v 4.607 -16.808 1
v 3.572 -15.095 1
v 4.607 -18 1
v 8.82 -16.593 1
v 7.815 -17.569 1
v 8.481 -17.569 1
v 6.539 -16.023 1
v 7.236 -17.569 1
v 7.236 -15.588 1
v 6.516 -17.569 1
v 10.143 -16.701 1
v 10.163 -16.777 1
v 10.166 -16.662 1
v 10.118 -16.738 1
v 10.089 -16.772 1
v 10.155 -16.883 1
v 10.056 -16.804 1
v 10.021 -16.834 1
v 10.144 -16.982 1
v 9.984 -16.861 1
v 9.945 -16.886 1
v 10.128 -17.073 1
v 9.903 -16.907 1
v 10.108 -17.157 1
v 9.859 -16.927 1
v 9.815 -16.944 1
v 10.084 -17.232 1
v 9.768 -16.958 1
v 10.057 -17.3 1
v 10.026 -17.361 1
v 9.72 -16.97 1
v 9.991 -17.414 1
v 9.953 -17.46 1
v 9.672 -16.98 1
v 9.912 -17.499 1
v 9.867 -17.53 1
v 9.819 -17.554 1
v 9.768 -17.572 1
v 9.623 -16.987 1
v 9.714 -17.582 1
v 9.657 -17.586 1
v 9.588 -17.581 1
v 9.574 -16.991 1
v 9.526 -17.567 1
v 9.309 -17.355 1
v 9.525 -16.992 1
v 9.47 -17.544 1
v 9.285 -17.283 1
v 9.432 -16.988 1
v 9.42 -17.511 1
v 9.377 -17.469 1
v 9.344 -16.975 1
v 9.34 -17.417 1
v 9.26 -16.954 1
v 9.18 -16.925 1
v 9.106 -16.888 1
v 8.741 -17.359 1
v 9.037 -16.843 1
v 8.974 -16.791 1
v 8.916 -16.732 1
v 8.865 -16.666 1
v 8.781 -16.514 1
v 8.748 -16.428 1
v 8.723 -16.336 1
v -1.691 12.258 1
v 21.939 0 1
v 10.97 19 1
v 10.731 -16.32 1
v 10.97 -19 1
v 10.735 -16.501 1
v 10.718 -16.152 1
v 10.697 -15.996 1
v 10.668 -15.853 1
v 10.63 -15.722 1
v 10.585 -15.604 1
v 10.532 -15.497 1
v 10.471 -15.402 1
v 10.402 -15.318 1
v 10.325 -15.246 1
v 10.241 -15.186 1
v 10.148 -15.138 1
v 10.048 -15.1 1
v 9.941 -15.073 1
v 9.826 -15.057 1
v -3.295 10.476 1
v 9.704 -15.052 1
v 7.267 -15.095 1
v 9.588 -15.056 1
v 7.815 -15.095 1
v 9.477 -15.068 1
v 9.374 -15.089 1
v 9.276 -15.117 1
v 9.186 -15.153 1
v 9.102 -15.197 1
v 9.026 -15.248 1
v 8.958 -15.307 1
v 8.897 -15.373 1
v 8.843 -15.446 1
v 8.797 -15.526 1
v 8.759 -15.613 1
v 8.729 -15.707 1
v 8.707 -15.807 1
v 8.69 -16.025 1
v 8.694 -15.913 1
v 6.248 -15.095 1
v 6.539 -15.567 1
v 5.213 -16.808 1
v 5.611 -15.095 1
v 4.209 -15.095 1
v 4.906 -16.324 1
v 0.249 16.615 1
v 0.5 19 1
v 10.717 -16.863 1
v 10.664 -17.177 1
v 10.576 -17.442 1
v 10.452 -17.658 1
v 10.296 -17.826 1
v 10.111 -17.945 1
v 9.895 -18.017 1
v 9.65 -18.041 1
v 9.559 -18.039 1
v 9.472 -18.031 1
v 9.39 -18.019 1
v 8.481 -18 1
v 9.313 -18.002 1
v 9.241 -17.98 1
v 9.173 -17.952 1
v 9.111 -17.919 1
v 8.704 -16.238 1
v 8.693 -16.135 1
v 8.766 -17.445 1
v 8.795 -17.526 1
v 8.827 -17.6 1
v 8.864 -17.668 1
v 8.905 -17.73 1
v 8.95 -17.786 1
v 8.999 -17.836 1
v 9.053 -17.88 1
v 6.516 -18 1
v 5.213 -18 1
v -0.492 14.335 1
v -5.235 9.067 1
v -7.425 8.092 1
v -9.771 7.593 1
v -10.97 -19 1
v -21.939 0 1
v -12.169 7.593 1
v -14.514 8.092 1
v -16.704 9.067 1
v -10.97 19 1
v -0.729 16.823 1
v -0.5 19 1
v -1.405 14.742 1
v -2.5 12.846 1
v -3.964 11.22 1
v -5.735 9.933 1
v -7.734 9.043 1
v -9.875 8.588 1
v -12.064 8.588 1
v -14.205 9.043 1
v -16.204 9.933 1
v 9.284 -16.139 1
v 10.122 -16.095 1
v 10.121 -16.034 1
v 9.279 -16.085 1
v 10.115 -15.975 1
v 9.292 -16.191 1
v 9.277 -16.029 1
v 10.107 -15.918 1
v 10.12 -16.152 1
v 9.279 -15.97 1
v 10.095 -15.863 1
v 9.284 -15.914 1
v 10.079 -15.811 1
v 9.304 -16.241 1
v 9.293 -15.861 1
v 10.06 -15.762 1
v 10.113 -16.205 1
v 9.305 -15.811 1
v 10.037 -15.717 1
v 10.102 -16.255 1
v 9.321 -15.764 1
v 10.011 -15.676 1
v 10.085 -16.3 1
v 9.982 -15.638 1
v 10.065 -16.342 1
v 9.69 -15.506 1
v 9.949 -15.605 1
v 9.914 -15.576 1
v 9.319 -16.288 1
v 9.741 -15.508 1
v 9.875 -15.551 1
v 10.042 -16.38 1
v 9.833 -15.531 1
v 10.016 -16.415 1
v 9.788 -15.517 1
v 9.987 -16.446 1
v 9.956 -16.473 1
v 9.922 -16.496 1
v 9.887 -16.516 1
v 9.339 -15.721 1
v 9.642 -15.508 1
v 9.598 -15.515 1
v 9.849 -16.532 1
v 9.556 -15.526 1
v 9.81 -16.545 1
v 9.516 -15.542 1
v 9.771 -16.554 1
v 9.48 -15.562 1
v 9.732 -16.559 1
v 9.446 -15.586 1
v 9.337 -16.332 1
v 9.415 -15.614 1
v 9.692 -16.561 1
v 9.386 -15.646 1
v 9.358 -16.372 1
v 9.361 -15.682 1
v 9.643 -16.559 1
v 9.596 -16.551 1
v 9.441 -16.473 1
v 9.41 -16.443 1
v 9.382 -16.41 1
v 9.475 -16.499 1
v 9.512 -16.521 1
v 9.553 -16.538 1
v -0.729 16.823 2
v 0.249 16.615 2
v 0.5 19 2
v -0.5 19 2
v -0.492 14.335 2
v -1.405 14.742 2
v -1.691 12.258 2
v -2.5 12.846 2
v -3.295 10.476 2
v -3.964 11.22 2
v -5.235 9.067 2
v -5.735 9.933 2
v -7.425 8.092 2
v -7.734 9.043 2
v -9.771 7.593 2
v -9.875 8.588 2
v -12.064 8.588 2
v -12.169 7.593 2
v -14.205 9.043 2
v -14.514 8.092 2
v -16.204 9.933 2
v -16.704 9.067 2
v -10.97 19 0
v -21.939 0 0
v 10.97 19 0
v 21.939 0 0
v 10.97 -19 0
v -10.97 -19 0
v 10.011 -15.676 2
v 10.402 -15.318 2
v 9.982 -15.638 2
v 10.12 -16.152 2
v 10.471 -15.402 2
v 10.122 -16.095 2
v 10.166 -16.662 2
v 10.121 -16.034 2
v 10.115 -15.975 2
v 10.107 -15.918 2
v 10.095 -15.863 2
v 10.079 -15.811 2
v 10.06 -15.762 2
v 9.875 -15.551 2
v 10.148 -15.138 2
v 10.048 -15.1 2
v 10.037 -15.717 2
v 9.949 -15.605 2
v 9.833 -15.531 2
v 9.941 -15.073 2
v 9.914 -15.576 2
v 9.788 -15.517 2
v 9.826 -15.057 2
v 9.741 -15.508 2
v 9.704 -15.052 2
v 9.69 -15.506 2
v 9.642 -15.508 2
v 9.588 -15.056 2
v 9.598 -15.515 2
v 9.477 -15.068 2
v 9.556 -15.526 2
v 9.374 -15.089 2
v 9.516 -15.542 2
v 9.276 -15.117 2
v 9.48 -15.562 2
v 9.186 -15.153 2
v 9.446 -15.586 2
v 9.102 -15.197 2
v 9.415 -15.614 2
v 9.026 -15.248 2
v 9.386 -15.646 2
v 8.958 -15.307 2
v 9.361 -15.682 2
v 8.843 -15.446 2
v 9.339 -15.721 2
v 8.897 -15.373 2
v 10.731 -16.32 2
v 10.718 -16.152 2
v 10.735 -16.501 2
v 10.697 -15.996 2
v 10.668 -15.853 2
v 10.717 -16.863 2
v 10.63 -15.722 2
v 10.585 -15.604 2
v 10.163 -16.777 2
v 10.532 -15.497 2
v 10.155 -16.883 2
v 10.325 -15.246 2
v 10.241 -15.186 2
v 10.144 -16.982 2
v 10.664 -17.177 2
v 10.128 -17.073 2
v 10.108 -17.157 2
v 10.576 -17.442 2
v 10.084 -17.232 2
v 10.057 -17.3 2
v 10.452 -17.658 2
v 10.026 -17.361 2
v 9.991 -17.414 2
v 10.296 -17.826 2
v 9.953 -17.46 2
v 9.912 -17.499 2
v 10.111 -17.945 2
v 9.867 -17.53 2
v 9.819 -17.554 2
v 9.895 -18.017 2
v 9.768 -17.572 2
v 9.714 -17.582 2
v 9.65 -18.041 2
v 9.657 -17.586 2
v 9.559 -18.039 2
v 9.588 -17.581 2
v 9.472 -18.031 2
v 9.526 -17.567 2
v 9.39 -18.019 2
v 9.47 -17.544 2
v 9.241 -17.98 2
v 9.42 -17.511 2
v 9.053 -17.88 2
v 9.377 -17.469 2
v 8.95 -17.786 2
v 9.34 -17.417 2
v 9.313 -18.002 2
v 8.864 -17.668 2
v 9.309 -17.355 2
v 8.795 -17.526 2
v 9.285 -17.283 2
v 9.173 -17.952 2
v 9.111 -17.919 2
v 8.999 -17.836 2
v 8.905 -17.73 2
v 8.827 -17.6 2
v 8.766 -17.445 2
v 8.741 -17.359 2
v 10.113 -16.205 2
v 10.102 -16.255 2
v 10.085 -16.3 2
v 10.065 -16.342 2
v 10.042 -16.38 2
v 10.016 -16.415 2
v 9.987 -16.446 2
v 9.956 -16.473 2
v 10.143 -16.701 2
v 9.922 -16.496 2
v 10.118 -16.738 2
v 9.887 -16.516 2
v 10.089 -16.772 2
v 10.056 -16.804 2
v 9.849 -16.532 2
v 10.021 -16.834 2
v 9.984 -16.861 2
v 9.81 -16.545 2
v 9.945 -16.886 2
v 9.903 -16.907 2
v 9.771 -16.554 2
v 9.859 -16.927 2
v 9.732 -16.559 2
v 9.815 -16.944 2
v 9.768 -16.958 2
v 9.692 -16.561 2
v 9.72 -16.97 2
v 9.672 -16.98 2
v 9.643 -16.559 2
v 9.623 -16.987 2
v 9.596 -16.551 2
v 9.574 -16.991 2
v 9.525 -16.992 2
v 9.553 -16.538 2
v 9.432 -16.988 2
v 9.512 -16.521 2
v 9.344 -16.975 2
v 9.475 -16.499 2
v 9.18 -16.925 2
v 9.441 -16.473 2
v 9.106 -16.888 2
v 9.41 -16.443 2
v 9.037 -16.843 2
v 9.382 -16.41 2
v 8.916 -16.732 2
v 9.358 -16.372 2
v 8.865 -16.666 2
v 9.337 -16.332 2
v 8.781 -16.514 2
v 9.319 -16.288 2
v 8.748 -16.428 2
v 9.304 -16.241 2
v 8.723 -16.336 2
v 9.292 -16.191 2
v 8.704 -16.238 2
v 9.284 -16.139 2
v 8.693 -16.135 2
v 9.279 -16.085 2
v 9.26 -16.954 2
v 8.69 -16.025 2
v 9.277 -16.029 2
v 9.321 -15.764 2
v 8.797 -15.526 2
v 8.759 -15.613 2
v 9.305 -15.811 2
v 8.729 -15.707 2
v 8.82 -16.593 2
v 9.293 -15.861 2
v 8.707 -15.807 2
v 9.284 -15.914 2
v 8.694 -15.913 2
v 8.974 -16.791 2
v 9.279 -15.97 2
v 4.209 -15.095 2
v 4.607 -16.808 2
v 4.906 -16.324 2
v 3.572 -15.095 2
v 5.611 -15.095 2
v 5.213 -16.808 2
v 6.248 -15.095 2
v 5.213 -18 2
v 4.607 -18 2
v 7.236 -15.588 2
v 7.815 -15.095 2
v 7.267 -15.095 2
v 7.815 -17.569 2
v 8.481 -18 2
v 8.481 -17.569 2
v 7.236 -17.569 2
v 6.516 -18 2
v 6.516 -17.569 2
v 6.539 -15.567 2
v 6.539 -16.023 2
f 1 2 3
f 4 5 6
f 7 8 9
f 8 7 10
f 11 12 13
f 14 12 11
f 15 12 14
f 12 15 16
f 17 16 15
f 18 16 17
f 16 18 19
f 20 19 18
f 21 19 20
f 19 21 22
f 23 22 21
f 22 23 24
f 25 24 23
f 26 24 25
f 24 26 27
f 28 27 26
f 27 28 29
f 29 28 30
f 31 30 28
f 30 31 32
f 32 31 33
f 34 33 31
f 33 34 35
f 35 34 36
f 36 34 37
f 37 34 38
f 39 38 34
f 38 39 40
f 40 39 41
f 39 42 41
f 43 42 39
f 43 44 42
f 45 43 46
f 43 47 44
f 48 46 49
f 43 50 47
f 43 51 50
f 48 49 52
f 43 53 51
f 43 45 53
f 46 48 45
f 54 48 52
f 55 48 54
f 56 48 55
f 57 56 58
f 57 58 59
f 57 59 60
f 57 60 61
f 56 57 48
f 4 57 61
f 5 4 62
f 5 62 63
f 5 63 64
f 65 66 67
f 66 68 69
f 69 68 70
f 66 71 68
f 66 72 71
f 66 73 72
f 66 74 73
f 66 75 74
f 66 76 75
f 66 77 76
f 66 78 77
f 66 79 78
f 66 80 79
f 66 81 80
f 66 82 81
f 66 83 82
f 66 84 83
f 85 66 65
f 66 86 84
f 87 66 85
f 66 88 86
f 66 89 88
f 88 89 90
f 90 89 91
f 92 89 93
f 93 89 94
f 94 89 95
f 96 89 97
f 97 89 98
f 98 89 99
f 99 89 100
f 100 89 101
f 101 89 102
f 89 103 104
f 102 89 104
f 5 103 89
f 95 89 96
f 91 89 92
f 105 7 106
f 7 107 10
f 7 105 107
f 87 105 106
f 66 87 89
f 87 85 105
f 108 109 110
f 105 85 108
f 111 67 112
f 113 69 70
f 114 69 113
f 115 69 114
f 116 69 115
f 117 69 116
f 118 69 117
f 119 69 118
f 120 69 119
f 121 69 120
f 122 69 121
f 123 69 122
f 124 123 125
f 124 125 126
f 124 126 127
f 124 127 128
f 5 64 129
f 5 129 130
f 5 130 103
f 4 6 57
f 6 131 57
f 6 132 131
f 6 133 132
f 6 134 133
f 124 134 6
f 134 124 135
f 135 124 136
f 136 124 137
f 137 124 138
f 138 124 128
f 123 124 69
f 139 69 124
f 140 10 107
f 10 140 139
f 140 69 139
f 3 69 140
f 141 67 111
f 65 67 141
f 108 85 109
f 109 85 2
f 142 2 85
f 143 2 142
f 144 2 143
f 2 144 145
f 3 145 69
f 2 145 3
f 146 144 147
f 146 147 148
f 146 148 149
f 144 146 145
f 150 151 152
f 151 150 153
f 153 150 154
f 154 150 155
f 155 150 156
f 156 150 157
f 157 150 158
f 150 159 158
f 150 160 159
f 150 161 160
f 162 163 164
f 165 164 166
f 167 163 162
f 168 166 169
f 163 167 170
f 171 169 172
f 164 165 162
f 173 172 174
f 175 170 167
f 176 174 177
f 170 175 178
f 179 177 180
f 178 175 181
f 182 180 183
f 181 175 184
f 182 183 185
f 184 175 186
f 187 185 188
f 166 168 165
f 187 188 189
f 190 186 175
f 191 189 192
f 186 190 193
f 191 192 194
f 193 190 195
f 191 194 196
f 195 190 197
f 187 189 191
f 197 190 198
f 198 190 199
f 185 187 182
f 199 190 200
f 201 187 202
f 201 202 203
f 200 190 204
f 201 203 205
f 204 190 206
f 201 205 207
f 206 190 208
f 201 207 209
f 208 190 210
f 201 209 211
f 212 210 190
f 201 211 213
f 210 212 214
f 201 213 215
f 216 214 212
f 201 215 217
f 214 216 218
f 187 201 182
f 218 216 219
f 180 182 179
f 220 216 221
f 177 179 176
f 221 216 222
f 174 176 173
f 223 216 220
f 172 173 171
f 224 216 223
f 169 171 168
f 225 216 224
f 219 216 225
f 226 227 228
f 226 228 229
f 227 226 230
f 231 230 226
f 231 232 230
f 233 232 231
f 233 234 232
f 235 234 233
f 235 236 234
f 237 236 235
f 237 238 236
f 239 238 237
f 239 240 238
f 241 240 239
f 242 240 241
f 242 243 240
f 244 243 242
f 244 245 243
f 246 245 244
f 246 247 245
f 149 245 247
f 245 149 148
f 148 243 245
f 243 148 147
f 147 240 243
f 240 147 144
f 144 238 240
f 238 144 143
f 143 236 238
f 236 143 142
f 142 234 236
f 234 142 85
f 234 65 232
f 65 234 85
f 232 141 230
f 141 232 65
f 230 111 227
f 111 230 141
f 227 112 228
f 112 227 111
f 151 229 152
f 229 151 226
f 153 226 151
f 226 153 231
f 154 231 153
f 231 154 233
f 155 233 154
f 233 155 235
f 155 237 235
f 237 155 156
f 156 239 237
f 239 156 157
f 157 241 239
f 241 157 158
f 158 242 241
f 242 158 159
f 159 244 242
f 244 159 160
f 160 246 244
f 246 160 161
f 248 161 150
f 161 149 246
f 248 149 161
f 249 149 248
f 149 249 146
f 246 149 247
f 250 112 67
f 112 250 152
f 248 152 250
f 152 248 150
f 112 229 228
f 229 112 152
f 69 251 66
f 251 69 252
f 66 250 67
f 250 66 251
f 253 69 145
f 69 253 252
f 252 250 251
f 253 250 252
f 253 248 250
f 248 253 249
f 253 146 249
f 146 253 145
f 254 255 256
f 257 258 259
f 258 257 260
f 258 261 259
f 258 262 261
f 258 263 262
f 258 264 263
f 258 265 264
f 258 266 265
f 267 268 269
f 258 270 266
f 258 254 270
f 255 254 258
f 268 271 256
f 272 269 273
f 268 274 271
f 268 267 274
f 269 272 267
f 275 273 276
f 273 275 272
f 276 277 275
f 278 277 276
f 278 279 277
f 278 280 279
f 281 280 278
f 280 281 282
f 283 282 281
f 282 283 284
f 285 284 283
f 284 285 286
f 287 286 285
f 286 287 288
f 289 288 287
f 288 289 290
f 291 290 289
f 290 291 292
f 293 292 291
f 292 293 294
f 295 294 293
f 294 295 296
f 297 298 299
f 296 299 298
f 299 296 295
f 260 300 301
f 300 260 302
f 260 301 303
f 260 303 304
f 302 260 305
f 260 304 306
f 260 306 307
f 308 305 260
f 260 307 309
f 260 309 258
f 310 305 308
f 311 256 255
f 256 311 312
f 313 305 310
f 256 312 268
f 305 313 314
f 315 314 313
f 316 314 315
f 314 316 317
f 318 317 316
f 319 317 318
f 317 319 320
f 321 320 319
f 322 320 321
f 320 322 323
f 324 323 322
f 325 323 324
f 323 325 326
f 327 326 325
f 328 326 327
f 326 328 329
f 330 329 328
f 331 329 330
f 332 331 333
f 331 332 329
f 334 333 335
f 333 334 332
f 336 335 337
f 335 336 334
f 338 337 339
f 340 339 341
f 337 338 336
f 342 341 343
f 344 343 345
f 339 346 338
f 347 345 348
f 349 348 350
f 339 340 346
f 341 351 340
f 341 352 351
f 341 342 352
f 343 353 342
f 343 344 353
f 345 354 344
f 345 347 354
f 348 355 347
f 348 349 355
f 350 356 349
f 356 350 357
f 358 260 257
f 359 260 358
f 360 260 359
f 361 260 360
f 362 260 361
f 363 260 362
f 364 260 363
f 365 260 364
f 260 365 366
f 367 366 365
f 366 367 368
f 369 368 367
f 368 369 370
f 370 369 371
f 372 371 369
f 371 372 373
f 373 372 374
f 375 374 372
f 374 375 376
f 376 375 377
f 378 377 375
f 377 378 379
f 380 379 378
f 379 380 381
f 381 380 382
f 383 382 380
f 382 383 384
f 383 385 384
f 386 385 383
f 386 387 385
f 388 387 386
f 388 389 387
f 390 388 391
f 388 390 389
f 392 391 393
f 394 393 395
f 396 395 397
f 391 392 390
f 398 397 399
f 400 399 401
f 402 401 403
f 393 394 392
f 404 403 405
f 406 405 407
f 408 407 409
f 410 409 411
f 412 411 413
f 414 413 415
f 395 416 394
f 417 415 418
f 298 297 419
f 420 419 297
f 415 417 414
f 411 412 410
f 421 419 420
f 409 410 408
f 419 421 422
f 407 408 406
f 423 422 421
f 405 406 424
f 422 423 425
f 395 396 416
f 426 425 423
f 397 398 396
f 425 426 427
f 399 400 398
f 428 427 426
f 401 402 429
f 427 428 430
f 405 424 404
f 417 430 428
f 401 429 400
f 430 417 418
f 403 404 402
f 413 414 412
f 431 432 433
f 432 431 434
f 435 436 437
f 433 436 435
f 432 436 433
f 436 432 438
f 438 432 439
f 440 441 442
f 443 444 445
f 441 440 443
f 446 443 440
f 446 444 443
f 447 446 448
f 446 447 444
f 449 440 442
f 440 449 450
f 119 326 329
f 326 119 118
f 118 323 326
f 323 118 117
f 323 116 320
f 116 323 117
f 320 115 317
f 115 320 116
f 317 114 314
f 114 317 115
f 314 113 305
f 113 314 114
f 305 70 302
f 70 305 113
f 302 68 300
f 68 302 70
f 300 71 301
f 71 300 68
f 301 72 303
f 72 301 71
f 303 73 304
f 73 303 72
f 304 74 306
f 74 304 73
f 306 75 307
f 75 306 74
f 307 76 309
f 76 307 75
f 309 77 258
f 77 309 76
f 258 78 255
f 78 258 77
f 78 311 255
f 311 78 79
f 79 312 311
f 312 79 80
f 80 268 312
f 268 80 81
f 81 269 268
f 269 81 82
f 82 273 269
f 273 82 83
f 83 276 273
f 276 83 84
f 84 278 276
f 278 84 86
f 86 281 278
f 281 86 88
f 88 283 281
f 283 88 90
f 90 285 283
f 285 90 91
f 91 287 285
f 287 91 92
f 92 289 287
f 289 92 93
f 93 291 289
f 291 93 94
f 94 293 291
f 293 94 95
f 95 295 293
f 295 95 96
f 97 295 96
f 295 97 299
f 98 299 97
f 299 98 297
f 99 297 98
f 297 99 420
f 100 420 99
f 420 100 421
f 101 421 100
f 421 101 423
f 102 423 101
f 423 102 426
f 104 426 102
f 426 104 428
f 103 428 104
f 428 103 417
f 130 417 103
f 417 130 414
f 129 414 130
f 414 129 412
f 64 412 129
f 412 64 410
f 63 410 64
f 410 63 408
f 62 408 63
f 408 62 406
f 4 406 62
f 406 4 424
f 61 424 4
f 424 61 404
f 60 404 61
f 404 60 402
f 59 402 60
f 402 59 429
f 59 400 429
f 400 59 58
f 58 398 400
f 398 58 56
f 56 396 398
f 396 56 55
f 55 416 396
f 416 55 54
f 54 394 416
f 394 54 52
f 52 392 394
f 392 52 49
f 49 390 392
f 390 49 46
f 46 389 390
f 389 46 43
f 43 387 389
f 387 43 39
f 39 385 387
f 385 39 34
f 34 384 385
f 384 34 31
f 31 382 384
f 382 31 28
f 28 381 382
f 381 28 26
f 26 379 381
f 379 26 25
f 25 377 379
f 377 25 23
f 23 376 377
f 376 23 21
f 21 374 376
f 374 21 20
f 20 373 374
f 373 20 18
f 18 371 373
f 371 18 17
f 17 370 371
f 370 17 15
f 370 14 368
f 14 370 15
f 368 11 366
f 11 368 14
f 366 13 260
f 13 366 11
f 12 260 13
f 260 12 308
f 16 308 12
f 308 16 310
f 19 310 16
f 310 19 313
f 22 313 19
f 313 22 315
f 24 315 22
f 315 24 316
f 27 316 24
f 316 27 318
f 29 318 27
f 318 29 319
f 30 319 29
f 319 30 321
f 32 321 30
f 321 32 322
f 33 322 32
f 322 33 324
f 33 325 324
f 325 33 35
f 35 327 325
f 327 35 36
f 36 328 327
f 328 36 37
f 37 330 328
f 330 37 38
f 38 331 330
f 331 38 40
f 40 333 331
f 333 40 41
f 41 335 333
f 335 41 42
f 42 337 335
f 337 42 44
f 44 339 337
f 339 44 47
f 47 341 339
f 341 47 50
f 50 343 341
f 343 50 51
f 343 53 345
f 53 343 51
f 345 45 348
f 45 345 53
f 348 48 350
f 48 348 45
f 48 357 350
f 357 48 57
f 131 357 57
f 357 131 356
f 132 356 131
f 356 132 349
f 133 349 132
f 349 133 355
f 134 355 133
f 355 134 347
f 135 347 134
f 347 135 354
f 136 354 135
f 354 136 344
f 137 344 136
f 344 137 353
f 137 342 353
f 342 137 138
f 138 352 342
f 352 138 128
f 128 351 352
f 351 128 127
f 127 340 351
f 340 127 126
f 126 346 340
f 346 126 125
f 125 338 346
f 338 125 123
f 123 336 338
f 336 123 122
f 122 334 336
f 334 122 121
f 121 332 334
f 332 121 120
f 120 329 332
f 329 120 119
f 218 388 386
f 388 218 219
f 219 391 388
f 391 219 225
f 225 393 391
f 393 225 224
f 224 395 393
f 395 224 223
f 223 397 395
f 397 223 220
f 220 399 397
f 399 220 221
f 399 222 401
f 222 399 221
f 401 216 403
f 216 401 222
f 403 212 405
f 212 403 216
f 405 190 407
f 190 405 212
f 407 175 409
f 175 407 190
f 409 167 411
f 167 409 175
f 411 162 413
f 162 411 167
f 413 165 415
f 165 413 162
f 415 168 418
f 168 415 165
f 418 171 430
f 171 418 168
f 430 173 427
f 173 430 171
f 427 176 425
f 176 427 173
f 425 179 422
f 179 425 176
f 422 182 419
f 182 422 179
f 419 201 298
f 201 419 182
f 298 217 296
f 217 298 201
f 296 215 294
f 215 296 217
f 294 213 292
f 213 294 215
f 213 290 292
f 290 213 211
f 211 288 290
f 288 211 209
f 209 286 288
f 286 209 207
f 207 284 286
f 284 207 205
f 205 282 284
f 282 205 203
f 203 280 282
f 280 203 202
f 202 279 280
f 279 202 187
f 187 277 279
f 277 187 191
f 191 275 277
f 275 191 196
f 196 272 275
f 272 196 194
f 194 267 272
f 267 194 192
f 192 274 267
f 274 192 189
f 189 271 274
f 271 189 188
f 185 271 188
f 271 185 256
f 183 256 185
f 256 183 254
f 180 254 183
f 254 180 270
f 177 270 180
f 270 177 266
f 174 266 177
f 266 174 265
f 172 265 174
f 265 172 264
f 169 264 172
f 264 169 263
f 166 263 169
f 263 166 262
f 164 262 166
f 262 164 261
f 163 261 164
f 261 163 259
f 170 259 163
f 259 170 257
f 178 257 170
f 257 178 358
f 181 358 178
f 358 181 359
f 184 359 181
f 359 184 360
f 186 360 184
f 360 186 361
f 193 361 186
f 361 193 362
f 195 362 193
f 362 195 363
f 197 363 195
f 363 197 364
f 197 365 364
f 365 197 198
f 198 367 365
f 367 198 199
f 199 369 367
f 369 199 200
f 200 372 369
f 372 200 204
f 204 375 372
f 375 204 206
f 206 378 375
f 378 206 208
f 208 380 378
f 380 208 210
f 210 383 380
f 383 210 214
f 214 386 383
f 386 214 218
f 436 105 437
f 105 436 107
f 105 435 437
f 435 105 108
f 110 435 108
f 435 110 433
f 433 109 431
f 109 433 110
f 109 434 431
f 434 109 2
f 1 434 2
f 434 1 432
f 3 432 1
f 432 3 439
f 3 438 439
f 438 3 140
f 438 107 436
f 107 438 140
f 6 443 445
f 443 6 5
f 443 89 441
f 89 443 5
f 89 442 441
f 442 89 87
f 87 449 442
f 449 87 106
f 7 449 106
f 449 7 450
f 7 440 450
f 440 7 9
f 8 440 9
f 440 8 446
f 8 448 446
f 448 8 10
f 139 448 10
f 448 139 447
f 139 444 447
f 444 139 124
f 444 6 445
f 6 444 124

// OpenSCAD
include <../../Scripts/18xx tiles basic functions.scad>
hex("blue");
put_tilenr("Y19");

sharp_curve(3);
//put_value_blue("10",30);
//single_city([1,2,4,5],"GWR");
